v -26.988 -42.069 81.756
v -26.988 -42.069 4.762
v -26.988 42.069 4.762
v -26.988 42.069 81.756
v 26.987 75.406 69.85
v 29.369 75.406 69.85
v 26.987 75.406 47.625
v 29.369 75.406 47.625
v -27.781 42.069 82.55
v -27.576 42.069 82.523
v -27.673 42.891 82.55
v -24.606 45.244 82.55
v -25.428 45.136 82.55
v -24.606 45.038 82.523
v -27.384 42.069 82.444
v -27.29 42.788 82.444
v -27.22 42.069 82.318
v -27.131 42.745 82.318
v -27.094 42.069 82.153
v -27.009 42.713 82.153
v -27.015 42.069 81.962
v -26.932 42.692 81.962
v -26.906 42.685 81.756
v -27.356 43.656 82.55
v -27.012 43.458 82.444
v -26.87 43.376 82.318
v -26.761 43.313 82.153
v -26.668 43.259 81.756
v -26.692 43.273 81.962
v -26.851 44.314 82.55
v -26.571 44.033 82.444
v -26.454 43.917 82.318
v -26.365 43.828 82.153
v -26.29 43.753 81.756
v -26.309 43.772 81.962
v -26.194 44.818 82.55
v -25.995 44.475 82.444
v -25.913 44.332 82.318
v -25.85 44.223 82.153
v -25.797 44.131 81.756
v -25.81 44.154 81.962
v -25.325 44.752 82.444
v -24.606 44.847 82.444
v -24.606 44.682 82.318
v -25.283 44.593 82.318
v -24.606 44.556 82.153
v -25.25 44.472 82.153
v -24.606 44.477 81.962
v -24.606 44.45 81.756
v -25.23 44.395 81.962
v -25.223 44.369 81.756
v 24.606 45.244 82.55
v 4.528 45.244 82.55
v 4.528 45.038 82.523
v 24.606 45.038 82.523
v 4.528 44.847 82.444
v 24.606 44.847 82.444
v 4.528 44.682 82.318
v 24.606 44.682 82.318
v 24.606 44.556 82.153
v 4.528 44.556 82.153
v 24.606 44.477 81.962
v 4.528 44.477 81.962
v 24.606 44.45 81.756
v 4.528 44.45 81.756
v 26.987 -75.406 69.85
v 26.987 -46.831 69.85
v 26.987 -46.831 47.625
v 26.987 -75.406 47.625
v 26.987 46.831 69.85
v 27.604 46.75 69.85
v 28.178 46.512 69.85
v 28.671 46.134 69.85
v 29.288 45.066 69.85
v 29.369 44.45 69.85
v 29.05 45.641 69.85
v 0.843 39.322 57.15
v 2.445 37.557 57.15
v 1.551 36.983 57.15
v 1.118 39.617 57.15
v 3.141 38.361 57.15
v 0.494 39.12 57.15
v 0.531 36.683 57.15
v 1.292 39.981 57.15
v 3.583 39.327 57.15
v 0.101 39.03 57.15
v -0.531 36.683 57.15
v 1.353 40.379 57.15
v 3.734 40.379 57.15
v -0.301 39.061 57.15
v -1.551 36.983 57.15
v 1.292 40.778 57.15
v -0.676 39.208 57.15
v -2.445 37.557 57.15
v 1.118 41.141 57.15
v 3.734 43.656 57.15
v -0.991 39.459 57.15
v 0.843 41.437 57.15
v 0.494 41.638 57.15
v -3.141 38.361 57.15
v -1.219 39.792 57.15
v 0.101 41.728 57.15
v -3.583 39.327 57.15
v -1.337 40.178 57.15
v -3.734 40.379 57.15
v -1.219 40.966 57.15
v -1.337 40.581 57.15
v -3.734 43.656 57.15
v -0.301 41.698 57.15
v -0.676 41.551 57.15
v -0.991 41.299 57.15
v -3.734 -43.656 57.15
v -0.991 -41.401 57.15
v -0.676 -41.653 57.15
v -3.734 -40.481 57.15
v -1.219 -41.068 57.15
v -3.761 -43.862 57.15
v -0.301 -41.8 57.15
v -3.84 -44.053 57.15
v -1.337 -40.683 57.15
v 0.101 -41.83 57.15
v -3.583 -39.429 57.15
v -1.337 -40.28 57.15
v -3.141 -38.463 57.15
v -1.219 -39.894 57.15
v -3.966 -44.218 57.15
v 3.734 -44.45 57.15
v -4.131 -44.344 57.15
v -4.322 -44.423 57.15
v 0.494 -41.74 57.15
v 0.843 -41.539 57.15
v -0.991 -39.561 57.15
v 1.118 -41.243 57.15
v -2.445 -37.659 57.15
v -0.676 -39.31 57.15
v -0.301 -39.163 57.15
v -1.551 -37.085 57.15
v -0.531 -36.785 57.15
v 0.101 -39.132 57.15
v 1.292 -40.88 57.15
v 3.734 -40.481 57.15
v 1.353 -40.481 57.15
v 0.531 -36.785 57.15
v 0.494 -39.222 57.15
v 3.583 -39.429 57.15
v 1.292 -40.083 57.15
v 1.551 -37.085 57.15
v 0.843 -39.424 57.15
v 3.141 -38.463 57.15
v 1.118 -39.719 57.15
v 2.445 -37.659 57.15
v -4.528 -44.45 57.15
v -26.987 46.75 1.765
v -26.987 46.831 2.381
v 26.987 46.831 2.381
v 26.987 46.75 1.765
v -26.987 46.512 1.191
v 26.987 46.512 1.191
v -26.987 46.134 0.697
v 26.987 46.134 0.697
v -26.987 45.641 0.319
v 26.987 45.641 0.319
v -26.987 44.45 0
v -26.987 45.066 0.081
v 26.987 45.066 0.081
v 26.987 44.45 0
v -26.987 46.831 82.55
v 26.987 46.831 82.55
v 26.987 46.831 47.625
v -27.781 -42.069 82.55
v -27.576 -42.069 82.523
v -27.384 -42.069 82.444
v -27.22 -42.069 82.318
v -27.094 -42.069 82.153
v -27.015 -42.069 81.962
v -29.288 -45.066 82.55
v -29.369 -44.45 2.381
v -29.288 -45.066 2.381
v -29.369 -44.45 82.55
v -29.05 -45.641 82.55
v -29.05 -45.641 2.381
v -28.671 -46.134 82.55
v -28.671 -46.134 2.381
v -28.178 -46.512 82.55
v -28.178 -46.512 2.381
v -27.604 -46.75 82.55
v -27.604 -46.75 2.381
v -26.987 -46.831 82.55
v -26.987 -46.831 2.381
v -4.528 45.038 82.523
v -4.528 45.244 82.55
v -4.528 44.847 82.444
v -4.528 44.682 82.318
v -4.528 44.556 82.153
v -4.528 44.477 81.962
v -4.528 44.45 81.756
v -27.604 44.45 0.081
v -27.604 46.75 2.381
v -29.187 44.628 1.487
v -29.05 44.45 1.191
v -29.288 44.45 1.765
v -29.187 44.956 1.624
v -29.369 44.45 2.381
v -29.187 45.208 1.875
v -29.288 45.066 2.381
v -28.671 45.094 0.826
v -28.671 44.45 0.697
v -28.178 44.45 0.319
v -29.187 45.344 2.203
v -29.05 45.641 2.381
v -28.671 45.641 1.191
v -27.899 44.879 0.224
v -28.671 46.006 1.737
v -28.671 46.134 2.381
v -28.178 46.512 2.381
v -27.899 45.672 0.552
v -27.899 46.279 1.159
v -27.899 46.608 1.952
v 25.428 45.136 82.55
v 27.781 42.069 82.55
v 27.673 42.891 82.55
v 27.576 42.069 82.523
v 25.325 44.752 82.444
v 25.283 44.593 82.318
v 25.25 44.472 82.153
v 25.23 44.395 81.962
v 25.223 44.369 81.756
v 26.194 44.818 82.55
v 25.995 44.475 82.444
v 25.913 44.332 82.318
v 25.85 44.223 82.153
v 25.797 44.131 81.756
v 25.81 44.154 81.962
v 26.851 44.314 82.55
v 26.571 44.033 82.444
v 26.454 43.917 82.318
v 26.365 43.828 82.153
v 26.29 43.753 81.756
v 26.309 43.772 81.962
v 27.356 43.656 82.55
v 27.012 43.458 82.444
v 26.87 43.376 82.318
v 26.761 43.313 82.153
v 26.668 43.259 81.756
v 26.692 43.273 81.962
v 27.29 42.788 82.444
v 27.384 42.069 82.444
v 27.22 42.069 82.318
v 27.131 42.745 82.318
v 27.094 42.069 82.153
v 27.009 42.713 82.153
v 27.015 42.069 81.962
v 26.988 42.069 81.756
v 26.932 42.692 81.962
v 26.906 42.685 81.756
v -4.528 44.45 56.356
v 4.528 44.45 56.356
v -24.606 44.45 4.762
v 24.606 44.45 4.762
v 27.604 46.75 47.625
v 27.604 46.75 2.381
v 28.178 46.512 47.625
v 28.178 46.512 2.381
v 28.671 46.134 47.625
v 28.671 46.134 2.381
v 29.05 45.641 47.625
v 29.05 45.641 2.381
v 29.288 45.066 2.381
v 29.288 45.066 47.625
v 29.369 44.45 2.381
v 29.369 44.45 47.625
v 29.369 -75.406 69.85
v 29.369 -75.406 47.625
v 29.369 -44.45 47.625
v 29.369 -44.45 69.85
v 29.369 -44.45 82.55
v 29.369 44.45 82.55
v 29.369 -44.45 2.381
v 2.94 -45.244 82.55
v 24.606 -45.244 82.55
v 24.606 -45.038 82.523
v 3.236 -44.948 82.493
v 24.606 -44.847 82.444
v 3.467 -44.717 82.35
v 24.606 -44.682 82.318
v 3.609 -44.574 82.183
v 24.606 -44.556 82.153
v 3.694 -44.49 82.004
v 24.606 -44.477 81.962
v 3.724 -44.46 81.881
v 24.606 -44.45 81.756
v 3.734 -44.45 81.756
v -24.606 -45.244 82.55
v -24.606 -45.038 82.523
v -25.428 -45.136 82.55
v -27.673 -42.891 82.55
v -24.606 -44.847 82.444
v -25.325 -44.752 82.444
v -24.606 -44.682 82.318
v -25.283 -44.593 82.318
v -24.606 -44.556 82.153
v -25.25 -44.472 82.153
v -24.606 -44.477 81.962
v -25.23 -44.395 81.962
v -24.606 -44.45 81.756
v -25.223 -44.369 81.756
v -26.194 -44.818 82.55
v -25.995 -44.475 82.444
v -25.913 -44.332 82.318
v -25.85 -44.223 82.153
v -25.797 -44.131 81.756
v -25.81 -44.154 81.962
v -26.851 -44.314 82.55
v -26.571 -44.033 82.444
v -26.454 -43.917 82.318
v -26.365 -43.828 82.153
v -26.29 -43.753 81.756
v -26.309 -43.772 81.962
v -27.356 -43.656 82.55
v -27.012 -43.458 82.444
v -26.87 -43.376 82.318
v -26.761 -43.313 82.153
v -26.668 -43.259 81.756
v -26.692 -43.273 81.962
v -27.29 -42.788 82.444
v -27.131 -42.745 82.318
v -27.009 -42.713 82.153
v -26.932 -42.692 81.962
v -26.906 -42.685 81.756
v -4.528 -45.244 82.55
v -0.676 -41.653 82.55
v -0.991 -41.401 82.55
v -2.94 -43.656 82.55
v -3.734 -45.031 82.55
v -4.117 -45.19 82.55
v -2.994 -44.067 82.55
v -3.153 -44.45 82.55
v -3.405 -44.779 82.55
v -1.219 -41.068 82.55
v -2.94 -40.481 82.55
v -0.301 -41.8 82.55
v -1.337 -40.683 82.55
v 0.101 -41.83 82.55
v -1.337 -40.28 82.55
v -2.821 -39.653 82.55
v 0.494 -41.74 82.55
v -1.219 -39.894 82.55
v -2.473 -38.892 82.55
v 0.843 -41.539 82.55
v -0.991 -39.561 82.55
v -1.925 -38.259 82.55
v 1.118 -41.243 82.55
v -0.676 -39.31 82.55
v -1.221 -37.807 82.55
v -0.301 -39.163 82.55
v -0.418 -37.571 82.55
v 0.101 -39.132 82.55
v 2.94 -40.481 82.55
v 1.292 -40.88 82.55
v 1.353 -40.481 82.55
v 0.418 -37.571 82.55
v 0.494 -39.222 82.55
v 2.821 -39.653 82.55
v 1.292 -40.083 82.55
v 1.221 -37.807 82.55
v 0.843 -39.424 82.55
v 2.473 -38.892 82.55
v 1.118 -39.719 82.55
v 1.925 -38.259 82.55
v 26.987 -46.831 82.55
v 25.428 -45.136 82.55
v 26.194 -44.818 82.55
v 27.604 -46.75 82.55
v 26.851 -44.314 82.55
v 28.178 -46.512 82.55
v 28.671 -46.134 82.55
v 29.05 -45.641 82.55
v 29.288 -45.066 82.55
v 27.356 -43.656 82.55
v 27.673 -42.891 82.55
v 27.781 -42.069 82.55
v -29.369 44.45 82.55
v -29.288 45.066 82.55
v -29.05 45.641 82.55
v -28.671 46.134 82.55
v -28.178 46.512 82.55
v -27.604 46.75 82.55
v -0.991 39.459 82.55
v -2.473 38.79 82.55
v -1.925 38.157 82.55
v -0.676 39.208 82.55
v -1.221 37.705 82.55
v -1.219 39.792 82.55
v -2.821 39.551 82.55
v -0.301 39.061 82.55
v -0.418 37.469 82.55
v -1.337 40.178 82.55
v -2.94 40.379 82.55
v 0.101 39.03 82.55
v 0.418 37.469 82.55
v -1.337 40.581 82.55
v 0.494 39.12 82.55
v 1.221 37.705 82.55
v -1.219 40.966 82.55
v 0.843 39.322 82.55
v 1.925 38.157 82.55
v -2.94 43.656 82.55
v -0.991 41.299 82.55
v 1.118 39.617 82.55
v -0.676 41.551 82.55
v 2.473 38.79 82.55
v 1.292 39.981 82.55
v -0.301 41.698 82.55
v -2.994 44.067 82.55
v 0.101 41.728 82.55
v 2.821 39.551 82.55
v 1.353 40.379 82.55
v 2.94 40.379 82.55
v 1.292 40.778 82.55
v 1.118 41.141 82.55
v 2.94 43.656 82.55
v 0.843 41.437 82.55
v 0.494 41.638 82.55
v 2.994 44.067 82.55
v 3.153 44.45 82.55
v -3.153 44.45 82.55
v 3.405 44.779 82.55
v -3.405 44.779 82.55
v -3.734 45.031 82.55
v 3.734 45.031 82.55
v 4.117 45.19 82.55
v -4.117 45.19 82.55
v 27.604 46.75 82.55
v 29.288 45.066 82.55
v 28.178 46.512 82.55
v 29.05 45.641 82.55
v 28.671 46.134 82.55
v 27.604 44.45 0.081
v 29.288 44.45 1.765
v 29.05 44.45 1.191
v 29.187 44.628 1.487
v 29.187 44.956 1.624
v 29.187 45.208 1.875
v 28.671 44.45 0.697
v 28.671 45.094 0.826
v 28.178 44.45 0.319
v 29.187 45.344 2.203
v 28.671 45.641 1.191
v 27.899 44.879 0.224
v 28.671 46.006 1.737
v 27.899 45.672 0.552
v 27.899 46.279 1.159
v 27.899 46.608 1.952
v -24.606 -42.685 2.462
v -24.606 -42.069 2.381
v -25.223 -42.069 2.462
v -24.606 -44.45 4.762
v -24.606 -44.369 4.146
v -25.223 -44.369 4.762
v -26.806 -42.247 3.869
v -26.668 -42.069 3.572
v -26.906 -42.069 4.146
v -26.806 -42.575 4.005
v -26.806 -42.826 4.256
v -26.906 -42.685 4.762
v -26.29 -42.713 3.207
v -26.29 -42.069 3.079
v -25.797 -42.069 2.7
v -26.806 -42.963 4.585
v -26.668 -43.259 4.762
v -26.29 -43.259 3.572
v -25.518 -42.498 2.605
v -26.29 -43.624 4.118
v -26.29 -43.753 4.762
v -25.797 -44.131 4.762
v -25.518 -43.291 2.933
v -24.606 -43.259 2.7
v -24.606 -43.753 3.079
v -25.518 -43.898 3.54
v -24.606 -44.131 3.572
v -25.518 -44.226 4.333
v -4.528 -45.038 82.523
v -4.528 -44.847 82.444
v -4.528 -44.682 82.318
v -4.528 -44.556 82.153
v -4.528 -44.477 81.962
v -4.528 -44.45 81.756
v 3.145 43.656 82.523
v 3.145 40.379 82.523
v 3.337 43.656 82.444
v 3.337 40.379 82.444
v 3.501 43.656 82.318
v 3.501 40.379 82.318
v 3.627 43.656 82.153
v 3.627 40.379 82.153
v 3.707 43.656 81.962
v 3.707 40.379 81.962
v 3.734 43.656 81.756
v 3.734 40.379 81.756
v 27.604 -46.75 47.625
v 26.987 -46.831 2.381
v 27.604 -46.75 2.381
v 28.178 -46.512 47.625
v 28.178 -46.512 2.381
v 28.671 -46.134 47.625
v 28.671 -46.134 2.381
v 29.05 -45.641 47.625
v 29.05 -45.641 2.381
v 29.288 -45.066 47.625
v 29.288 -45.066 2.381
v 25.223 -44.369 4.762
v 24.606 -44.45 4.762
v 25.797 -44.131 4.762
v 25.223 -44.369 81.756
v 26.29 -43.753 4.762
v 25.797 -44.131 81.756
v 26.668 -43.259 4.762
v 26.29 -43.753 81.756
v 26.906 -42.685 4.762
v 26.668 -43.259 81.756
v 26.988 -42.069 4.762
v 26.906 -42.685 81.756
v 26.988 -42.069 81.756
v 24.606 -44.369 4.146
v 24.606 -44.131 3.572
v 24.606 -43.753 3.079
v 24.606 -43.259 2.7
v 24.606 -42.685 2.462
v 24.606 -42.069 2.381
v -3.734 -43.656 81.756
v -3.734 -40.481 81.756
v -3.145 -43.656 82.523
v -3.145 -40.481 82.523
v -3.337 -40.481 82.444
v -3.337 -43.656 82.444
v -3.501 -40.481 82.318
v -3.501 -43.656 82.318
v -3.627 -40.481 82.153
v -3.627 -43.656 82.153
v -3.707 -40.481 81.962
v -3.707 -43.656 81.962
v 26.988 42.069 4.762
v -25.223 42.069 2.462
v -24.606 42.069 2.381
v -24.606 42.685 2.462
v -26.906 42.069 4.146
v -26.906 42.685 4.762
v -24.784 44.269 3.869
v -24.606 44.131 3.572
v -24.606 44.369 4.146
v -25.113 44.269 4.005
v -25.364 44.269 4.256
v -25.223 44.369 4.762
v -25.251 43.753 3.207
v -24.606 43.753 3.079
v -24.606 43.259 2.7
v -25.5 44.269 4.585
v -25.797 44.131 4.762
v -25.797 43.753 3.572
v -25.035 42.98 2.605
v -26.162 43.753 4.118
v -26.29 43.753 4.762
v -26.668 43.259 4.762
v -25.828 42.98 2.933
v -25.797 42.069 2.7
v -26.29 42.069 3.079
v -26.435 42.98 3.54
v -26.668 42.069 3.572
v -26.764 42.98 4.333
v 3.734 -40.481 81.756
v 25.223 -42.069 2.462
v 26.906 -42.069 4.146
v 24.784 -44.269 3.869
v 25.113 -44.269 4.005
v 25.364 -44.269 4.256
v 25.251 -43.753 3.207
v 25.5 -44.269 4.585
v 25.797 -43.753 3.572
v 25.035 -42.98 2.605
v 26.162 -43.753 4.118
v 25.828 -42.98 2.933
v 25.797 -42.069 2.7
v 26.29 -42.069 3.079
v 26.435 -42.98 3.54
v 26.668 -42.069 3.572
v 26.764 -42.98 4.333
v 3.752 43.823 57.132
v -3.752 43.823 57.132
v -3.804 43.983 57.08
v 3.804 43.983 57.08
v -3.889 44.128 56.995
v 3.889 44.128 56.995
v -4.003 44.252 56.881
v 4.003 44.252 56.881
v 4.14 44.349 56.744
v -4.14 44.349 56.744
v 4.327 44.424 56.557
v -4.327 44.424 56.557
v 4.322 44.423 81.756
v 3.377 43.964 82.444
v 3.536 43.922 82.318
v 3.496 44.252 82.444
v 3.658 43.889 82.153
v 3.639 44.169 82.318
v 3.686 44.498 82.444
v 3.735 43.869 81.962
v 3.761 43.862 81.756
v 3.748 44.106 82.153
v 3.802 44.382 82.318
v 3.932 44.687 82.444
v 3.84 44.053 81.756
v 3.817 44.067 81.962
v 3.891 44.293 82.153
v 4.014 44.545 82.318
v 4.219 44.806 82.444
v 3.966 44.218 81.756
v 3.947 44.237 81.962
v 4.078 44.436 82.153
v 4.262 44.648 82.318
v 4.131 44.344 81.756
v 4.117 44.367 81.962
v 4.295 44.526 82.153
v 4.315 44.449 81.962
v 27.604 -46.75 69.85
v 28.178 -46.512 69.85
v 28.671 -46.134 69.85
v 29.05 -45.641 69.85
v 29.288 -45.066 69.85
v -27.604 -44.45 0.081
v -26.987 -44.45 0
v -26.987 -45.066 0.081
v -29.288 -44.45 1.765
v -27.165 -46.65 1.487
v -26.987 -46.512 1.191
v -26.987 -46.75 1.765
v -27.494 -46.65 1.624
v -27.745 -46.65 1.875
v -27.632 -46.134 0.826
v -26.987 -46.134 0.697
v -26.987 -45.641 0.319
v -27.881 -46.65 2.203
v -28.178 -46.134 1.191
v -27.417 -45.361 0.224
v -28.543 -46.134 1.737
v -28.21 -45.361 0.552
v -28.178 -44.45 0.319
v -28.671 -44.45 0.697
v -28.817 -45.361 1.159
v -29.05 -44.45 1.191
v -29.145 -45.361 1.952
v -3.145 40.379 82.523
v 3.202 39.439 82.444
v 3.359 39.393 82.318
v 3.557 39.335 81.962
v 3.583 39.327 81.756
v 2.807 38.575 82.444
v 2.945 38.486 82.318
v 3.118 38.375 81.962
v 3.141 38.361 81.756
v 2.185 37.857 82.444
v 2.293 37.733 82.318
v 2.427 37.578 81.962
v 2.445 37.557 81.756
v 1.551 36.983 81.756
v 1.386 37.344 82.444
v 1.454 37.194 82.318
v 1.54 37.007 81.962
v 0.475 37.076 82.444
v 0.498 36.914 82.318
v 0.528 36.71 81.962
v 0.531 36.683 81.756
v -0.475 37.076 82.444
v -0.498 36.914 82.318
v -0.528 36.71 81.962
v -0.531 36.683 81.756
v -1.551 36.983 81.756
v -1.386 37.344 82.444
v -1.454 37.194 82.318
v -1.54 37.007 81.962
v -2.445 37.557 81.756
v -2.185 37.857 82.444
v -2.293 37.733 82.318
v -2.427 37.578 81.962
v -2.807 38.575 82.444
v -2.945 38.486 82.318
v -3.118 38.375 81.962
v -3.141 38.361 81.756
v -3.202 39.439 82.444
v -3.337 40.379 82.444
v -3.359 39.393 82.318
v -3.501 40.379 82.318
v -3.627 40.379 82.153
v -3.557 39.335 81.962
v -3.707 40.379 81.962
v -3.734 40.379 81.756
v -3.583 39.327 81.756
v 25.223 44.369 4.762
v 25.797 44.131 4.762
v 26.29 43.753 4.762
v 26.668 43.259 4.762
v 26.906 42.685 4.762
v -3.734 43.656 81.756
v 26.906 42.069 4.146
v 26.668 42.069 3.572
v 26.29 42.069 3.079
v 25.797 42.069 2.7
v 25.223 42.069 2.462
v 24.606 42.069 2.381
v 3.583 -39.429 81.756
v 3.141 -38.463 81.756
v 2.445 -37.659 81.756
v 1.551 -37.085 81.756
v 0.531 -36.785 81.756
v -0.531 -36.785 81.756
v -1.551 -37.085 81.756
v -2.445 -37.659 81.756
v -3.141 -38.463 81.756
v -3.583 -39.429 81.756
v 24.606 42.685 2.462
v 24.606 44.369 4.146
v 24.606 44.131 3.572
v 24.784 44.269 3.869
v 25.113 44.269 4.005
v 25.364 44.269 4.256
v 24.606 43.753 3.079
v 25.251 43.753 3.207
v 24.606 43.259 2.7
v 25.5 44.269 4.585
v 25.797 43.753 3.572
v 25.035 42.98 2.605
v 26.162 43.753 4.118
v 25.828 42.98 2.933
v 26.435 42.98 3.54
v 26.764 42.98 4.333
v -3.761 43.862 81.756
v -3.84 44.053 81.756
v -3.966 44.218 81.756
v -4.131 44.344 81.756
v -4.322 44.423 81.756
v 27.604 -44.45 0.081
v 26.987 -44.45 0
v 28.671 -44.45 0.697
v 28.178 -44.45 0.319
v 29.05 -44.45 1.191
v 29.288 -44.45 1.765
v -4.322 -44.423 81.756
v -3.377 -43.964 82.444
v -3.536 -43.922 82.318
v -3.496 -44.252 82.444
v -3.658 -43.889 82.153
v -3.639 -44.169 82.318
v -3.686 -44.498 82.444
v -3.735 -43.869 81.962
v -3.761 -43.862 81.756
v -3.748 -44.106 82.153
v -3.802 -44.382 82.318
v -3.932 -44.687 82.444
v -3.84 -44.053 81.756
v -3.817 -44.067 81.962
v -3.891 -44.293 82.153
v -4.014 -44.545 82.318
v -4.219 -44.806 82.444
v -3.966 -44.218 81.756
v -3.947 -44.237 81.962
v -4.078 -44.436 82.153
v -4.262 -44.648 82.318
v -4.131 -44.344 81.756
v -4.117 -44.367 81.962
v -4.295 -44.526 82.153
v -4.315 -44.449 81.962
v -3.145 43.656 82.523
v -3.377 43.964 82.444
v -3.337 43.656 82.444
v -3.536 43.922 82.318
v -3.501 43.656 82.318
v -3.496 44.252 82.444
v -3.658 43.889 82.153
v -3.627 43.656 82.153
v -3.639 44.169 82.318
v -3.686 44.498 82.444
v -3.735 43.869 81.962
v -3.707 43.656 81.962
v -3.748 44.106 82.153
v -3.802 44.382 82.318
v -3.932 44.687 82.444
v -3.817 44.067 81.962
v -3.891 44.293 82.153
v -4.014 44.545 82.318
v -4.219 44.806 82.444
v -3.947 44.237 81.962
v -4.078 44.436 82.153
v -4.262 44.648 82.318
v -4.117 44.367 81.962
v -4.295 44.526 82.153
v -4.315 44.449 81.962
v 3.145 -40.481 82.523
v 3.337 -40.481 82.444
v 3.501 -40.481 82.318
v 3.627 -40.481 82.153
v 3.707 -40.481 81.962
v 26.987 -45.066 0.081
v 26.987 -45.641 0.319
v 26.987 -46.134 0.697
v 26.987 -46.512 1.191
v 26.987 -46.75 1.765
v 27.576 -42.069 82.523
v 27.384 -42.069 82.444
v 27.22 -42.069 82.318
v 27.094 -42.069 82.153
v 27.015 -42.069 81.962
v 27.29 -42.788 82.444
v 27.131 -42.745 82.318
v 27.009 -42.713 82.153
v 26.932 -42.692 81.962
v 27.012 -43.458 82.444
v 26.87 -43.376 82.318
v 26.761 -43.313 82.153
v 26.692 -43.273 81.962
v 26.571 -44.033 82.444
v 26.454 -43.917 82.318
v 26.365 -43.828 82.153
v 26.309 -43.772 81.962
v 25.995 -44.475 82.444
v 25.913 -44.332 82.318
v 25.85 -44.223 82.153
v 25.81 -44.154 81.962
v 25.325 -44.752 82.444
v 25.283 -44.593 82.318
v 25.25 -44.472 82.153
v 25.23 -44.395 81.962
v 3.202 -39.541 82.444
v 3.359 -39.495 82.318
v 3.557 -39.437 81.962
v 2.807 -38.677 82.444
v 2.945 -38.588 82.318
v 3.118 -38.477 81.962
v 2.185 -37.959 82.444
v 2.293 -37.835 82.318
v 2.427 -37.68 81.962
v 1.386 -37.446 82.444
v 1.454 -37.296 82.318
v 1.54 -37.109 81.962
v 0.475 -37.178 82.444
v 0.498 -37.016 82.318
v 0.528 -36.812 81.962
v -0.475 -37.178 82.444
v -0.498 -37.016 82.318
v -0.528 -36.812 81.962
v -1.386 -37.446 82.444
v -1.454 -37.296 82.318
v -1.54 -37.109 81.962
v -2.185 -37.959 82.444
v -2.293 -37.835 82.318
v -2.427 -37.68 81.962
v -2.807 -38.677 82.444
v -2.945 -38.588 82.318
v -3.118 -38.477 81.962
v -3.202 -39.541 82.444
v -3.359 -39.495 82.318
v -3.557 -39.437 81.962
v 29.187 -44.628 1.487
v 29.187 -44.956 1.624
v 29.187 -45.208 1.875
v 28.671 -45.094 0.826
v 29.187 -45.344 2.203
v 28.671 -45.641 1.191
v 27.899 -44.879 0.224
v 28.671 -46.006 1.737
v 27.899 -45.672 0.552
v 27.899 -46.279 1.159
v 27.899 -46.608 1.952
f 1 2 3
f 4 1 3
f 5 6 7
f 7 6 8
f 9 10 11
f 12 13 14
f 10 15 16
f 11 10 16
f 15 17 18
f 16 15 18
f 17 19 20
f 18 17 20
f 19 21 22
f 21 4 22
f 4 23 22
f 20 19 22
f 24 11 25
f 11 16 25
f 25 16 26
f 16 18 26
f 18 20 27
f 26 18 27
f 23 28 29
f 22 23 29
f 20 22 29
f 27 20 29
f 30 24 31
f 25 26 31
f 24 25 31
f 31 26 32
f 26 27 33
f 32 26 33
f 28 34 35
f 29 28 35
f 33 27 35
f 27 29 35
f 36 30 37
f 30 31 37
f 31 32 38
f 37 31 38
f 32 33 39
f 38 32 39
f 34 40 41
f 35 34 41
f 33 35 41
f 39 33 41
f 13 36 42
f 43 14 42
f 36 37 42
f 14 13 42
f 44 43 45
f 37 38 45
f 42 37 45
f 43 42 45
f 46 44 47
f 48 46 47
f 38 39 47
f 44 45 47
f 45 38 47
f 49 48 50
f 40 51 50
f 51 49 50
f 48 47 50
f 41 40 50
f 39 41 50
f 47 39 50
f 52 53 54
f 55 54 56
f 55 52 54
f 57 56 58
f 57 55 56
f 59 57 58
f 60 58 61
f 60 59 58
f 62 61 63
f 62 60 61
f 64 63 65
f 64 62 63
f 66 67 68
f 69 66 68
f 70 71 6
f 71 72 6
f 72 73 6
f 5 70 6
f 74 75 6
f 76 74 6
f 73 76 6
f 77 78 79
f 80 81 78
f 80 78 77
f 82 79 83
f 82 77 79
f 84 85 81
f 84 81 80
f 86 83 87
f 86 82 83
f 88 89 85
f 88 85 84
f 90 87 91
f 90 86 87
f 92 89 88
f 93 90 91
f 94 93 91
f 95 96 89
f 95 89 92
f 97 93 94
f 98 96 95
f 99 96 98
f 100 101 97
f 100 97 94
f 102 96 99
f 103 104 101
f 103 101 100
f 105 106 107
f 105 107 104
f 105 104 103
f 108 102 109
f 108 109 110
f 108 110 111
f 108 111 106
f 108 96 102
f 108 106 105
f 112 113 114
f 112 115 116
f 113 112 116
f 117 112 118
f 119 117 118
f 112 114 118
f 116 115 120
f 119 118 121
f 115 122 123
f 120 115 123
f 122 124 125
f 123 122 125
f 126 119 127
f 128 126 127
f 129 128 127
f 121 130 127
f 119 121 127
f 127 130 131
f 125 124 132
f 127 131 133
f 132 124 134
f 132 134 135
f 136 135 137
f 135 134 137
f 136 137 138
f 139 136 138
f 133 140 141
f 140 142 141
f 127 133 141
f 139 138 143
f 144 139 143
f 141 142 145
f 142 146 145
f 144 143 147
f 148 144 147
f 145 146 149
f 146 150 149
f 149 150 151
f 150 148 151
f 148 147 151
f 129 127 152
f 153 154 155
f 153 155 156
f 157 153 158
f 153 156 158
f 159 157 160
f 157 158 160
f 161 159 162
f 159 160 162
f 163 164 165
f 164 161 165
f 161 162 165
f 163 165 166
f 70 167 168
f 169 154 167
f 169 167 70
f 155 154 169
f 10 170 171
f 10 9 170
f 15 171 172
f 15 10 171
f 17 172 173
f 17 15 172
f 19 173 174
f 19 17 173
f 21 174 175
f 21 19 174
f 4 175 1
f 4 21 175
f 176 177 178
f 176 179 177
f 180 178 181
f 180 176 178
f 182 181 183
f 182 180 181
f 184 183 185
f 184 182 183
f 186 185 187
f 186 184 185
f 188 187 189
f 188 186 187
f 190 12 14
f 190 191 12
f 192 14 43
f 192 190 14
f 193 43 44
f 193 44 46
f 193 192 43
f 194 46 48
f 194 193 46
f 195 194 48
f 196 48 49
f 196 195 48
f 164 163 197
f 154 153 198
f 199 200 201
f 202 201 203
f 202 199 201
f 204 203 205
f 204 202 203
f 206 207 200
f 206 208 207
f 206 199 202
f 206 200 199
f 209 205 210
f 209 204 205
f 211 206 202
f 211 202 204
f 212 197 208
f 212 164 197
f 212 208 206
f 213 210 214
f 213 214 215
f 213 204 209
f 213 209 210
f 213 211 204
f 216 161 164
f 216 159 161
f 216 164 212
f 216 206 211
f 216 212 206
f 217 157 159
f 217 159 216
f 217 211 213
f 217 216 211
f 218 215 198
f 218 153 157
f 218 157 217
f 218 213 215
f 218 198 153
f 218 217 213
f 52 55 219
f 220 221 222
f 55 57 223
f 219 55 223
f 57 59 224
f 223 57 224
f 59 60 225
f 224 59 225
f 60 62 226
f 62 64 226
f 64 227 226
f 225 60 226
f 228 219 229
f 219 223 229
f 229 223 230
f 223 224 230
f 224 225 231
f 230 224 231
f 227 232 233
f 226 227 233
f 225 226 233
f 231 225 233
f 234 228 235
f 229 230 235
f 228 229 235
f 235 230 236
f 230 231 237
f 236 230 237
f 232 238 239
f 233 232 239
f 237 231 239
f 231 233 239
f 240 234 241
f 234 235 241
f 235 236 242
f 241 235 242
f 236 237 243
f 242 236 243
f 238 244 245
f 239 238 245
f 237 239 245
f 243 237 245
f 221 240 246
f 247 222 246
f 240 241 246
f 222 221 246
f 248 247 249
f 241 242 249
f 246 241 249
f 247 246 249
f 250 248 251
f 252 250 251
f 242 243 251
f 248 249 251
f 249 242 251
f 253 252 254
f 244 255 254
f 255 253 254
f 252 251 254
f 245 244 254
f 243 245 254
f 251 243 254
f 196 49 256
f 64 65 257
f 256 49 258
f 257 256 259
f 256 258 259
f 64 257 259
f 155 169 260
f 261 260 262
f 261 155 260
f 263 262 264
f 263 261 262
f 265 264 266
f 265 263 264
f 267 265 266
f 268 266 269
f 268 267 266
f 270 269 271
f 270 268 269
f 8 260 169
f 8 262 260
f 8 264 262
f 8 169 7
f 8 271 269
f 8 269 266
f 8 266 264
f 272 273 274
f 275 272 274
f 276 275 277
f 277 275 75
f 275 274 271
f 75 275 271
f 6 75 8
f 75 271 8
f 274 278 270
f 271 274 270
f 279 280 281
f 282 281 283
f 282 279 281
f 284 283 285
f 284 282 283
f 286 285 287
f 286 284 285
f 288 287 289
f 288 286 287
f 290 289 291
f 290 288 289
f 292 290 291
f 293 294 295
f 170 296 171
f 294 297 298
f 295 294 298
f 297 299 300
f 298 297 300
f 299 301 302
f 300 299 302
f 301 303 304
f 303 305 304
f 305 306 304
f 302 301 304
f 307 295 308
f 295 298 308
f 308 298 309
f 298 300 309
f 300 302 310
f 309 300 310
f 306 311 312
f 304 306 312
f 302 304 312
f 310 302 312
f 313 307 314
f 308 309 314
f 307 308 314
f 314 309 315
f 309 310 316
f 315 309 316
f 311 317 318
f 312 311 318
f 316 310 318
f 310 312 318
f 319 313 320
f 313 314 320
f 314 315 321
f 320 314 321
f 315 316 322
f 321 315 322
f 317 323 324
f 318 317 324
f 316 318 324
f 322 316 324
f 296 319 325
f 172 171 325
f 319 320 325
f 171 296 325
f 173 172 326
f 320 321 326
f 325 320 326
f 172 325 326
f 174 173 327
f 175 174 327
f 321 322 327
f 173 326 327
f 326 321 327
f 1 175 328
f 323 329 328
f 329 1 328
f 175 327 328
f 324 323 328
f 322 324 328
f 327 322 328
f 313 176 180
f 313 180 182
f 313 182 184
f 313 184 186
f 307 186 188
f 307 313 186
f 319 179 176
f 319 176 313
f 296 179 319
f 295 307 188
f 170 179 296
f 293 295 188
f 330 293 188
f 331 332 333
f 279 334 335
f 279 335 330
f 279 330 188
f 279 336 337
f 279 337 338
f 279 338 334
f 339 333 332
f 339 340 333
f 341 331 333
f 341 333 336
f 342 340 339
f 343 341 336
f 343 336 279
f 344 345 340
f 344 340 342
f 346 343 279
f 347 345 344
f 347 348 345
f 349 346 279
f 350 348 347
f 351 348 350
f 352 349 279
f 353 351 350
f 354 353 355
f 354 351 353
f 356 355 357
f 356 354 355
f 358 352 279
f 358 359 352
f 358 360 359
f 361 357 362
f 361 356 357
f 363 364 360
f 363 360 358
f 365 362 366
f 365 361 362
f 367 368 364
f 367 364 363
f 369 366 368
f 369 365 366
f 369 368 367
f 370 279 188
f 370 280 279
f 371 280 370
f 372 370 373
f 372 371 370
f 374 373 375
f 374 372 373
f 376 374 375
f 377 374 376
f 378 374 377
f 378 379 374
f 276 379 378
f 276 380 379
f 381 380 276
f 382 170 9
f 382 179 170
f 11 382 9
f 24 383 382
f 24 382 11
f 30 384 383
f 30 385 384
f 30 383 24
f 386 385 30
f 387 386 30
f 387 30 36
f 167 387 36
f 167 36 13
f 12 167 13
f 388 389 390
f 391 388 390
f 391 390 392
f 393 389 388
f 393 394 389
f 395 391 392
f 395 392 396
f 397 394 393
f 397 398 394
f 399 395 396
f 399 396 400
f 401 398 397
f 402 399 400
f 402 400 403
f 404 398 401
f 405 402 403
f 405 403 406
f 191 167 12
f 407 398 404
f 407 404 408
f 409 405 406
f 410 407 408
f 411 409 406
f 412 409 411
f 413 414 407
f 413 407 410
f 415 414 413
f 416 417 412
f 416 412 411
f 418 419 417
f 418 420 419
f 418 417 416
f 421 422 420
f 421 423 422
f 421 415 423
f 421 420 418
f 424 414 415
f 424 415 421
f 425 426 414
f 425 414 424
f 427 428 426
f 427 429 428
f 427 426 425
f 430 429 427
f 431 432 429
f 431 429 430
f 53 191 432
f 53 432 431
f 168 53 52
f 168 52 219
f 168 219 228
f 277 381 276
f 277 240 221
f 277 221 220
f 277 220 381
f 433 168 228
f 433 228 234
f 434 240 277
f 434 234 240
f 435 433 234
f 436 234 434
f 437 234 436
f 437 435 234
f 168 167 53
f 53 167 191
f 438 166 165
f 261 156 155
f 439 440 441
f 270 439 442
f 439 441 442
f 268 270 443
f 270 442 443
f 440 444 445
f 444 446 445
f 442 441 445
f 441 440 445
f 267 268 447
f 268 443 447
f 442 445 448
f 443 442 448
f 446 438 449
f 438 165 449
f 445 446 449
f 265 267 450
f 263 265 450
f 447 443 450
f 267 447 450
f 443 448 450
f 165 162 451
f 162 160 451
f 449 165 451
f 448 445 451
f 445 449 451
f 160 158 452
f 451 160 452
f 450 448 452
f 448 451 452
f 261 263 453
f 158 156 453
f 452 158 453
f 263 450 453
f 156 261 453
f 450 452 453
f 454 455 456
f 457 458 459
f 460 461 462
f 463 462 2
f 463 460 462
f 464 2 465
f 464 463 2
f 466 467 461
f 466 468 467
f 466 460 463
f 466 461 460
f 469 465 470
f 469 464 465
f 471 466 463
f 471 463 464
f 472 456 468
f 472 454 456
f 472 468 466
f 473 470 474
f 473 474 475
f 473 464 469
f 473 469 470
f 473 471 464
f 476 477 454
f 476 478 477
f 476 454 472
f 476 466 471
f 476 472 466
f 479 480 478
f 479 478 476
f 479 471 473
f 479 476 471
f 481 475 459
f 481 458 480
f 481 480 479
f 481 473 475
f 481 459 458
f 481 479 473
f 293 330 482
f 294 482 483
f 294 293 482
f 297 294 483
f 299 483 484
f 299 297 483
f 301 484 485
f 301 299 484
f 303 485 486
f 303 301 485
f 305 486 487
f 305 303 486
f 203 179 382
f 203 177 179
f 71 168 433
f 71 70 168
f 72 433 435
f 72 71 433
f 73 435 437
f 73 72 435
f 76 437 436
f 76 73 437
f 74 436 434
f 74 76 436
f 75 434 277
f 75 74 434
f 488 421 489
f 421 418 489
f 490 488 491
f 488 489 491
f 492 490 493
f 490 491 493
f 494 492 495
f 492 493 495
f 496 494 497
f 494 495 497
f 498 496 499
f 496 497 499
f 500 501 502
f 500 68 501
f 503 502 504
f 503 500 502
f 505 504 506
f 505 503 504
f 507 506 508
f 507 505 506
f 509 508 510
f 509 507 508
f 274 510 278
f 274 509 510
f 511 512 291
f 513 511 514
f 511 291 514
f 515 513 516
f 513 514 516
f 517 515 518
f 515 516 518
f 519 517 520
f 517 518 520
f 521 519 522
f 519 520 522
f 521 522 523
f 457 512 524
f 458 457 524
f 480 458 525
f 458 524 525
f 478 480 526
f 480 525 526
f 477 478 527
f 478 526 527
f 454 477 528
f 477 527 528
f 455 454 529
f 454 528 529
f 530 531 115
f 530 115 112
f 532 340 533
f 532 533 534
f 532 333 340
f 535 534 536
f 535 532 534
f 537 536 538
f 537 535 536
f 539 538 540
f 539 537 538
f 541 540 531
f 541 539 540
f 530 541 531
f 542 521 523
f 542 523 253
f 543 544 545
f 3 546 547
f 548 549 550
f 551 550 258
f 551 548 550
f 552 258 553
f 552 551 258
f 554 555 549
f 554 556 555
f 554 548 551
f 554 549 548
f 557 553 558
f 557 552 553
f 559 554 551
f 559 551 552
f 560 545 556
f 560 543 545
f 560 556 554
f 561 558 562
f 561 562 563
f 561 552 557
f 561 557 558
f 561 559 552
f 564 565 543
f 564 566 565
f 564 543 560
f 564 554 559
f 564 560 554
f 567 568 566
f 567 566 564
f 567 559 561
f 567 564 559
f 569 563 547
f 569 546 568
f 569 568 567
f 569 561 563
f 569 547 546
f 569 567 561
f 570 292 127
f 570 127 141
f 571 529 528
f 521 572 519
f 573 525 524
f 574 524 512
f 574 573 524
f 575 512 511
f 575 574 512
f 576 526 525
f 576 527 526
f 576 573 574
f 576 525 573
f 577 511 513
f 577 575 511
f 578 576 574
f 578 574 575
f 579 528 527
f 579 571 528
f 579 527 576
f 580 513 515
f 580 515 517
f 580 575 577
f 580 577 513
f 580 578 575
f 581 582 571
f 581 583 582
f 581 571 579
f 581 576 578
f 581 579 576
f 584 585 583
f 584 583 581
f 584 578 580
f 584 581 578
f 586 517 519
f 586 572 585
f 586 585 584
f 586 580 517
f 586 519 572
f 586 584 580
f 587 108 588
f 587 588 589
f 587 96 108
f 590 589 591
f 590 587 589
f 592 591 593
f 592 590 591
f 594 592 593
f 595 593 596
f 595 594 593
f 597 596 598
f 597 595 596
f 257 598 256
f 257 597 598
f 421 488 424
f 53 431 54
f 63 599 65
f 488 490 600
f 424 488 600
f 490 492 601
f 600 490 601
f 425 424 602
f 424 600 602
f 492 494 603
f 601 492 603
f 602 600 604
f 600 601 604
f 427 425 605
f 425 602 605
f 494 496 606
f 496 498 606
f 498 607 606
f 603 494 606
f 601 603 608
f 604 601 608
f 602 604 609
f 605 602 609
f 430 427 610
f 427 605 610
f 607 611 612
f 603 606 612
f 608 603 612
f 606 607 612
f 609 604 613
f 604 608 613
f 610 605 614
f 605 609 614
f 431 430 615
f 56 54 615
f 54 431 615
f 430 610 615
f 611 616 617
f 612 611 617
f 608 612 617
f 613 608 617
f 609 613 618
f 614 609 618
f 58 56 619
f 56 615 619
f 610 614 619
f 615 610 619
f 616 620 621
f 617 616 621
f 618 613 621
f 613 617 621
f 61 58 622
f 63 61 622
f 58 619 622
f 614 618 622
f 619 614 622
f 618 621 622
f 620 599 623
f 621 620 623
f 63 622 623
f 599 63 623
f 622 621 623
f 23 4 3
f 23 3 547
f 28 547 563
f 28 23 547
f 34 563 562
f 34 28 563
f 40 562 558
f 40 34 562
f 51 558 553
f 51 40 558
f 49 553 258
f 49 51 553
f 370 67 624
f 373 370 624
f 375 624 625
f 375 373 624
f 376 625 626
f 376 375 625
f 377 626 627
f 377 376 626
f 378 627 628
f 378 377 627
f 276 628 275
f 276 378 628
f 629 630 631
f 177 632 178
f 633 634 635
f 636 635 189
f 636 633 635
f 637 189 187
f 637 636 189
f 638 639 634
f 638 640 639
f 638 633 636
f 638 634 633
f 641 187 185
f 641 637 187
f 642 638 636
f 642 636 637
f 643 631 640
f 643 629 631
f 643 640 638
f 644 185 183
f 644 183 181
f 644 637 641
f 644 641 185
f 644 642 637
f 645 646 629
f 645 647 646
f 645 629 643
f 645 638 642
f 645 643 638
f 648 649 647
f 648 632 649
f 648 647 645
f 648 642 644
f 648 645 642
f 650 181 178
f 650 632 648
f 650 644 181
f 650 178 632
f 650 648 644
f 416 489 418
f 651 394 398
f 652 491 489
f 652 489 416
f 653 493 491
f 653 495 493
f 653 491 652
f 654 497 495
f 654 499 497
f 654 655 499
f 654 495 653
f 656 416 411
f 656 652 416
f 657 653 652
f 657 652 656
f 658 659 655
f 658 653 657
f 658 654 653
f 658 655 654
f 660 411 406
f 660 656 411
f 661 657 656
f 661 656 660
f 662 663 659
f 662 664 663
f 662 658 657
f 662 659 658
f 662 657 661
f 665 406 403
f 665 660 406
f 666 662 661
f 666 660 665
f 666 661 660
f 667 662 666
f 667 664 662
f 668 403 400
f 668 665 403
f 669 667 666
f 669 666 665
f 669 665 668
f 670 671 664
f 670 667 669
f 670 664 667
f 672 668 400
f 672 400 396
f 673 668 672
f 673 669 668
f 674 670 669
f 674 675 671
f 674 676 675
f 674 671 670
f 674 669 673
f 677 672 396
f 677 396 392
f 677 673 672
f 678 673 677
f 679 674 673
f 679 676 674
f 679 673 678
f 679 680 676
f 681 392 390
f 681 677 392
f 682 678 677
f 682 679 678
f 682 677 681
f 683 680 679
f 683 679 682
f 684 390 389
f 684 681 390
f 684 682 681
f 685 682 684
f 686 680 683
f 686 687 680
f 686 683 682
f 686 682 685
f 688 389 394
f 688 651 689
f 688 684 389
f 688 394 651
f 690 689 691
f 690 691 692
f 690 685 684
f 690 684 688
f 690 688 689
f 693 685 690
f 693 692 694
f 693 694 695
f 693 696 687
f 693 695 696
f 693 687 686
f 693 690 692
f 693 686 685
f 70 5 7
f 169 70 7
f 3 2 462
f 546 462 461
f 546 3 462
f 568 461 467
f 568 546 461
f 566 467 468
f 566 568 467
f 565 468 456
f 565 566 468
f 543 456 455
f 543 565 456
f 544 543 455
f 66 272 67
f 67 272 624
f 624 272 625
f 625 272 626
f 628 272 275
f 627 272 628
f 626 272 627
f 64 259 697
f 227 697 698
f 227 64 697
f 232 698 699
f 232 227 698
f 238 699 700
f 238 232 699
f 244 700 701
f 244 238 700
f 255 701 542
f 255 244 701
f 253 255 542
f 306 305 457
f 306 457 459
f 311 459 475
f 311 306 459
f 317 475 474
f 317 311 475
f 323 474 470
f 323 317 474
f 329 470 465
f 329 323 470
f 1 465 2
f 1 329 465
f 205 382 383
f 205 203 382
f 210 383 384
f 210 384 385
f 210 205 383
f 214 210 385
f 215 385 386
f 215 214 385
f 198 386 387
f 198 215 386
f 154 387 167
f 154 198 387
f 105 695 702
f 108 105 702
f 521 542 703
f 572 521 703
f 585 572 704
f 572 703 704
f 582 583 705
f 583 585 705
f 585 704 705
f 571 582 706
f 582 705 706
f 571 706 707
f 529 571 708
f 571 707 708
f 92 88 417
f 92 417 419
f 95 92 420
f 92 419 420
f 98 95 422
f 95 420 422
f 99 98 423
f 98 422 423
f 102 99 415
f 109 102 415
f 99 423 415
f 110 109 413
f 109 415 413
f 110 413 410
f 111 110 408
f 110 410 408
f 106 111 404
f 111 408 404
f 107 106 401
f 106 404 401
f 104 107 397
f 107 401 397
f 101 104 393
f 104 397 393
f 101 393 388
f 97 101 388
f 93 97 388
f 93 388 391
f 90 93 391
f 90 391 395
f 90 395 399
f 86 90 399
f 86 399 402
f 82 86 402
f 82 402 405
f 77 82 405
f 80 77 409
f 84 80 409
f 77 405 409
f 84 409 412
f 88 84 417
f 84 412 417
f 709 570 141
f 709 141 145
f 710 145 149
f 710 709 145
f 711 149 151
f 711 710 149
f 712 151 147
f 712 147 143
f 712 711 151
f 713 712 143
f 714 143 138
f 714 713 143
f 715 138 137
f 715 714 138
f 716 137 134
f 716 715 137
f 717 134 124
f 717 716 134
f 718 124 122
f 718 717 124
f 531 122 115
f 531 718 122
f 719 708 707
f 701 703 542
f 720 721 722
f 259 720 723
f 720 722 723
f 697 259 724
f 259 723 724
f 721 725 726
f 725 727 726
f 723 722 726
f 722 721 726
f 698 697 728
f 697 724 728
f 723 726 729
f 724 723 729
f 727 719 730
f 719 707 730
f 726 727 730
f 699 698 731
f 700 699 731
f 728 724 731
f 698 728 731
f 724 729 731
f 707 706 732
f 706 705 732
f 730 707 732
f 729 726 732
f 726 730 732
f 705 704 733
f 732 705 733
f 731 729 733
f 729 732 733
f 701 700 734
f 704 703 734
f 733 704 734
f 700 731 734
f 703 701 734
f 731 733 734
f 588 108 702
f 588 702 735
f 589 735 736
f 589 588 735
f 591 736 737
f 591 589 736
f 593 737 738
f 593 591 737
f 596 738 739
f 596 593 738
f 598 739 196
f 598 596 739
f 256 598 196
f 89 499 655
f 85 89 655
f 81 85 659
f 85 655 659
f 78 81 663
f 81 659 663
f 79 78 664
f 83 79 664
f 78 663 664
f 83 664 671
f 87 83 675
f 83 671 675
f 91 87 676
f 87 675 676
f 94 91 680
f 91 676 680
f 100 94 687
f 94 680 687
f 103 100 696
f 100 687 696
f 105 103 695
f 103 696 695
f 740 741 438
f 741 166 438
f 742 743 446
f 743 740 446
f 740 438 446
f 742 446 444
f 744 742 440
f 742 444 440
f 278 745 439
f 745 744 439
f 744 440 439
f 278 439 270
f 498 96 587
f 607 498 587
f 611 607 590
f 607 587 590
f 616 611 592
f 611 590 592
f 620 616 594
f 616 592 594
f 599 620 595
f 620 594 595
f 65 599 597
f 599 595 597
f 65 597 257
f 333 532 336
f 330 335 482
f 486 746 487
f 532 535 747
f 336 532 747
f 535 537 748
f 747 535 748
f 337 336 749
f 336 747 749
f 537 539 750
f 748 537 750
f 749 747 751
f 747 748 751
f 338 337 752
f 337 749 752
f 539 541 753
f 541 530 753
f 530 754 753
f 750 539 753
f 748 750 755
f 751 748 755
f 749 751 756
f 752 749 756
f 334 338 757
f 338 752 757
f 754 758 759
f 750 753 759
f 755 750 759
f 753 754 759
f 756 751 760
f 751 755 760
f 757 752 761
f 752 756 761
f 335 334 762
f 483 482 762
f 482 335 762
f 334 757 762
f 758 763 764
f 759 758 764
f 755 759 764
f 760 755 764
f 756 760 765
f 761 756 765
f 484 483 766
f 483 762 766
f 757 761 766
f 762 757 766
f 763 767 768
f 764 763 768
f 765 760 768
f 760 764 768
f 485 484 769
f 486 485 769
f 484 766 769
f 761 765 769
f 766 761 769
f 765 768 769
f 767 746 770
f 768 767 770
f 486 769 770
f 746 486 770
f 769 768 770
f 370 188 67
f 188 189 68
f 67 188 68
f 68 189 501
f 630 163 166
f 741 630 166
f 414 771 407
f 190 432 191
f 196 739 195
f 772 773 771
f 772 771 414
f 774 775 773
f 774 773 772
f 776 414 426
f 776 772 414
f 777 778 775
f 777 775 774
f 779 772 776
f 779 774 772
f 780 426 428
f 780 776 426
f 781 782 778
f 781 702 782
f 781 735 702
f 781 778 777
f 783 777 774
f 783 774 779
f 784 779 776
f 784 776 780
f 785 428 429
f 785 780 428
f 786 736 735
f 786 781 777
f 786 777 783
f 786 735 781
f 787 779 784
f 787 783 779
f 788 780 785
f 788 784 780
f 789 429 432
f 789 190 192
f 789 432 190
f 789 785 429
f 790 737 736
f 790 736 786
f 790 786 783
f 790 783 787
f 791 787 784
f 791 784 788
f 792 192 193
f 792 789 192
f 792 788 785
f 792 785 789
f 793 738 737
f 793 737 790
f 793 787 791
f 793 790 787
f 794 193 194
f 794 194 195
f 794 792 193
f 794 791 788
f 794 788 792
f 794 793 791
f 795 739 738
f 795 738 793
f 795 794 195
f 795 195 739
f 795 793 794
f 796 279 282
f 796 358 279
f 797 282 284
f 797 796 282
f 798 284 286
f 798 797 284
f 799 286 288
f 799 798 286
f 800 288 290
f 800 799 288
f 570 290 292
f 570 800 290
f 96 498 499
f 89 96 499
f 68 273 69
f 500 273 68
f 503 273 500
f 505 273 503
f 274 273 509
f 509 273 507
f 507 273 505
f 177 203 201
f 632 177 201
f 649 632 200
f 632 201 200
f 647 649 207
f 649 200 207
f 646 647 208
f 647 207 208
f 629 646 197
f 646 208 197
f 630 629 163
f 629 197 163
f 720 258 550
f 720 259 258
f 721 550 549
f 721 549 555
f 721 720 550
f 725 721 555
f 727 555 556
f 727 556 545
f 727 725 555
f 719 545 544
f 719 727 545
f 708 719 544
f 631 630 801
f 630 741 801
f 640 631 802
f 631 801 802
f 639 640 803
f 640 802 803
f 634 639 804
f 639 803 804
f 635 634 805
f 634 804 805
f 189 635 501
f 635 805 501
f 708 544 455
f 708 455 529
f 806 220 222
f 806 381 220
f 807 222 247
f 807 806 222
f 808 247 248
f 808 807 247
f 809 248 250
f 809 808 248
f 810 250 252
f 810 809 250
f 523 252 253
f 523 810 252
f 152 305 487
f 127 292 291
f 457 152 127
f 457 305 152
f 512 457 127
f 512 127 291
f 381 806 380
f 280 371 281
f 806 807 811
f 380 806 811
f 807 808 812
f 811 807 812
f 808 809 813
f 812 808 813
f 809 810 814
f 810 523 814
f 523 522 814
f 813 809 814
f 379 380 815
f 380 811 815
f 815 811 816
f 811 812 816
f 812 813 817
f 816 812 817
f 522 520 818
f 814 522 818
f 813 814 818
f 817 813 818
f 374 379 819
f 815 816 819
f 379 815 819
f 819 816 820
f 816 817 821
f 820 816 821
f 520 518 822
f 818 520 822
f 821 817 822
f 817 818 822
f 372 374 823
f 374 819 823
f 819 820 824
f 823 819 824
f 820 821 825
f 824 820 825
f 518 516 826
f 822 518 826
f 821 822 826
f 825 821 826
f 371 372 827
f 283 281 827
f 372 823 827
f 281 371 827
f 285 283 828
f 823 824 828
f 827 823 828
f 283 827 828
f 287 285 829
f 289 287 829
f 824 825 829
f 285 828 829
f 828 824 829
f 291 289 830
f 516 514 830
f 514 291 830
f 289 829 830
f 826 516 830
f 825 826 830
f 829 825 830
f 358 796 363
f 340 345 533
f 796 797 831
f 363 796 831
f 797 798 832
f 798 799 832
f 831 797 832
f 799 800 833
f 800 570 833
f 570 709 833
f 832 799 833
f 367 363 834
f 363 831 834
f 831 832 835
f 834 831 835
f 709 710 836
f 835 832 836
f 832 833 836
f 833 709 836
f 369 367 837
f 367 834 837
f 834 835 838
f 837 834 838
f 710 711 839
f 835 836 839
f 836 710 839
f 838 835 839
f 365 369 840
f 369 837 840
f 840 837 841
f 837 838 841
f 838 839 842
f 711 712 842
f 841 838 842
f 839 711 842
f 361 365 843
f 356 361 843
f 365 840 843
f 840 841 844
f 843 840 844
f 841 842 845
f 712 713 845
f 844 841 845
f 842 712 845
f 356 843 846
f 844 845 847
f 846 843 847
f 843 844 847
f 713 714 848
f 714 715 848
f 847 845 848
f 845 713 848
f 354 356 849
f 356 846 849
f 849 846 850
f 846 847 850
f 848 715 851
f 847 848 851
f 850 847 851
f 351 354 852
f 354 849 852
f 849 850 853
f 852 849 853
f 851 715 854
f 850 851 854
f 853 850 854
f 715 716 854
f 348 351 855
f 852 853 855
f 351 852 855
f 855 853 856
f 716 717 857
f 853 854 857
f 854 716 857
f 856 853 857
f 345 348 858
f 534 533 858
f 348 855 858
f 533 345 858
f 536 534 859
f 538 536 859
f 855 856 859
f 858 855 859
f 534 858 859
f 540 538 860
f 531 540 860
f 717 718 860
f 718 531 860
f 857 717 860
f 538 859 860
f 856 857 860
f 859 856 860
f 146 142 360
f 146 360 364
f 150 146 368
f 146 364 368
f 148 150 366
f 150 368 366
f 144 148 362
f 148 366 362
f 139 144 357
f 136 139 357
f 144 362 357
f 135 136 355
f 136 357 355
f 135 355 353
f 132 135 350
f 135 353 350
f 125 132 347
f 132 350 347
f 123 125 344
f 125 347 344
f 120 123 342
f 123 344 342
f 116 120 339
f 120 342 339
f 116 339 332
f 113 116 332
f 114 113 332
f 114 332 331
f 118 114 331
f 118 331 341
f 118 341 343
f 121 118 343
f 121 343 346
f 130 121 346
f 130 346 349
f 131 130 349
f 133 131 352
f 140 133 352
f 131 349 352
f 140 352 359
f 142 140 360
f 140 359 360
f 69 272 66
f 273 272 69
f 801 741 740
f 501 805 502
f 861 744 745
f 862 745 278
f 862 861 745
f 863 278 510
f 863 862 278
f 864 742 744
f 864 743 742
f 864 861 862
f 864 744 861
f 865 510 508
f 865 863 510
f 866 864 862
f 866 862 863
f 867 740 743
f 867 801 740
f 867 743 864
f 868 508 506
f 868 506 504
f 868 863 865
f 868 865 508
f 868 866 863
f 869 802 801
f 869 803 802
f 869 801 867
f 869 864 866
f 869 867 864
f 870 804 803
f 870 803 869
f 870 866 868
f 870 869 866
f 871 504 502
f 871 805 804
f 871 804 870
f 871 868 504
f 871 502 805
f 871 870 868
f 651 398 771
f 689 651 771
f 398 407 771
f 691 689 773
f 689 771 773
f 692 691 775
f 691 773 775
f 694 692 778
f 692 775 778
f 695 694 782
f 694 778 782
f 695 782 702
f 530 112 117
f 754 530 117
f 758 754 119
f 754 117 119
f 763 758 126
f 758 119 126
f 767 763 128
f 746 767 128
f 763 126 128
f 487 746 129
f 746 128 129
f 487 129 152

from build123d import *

# Parameters (mm, degrees)
SKETCH1_W           = 58.7375
SKETCH1_H           = 93.6625
BACK_DEPTH          = 2.38125
SKETCH2_W           = 58.7375
SKETCH2_H           = 93.6625
SKETCH2_W_2         = 53.975
SKETCH2_H_2         = 88.9
SIDES_DEPTH         = 80.16875
SKETCH6_R           = 1.35255
BOSS_EXTRUDE6_DEPTH = 25.4
SKETCH5_W           = 22.225
SKETCH5_H           = 28.575
BOSS_EXTRUDE5_DEPTH = 2.38125
FILLET4_R           = 2.38125
FILLET5_R           = 0.79375


with BuildPart() as part:
    # Sketch1 → Back (new body)
    with BuildSketch(Plane.XY):
        Rectangle(SKETCH1_W, SKETCH1_H)
    extrude(amount=BACK_DEPTH)

    # Sketch2 → Sides (add)
    with BuildSketch(Plane.XY.offset(2.38125)):
        Rectangle(SKETCH2_W, SKETCH2_H)
        Rectangle(SKETCH2_W_2, SKETCH2_H_2, mode=Mode.SUBTRACT)
    extrude(amount=SIDES_DEPTH)

    # Sketch6 → Boss-Extrude6 (add)
    # profile 1 of 2: a face of its own
    with BuildSketch(Plane.XY.offset(82.55)):
        with BuildLine():
            Line((-3.7338, 40.379264529), (-3.7338, 44.45))
            Line((-3.7338, 44.45), (3.7338, 44.45))
            Line((3.7338, 44.45), (3.7338, 40.379264529))
            ThreePointArc((3.7338, 40.379264529), (0, 36.645464529), (-3.7338, 40.379264529))
        make_face()
        with Locations((0, 40.379264529)):
            Circle(SKETCH6_R, mode=Mode.SUBTRACT)
    # profile 2 of 2: a face of its own
    with BuildSketch(Plane.XY.offset(82.55)):
        with BuildLine():
            Line((-3.7338, -40.48125), (-3.7338, -44.45))
            Line((-3.7338, -44.45), (3.7338, -44.45))
            Line((3.7338, -44.45), (3.7338, -40.48125))
            ThreePointArc((3.7338, -40.48125), (0, -36.74745), (-3.7338, -40.48125))
        make_face()
        with Locations((0, -40.48125)):
            Circle(SKETCH6_R, mode=Mode.SUBTRACT)
    extrude(amount=-BOSS_EXTRUDE6_DEPTH)

    # Sketch5 → Boss-Extrude5 (add)
    with BuildSketch(Plane(origin=(29.36875, 0, 0), x_dir=(0, 0, -1), z_dir=(1, 0, 0))):
        with Locations((-58.7375, 61.11875)):
            Rectangle(SKETCH5_W, SKETCH5_H)
        with Locations((-58.7375, -61.11875)):
            Rectangle(SKETCH5_W, SKETCH5_H)
    extrude(amount=-BOSS_EXTRUDE5_DEPTH)

    # Fillet4
    fillet4_edges = [part.edges().sort_by_distance(p)[0] for p in [
        (26.9875, 0, 2.38125),
        (0, -44.45, 2.38125),
        (-26.9875, 0, 2.38125),
        (0, 44.45, 2.38125),
        (0, 46.83125, 0),
        (-29.36875, 0, 0),
        (0, -46.83125, 0),
        (29.36875, 0, 0),
        (-26.9875, -44.45, 42.465625),
        (-26.9875, 44.45, 42.465625),
        (26.9875, 44.45, 42.465625),
        (26.9875, -44.45, 42.465625),
        (29.36875, 46.83125, 23.8125),
        (29.36875, -46.83125, 23.8125),
        (29.36875, -46.83125, 76.2),
        (29.36875, 46.83125, 76.2),
        (-29.36875, -46.83125, 41.275),
        (-29.36875, 46.83125, 41.275),
    ]]
    fillet(fillet4_edges, radius=FILLET4_R)

    # Fillet5
    fillet5_edges = [part.edges().sort_by_distance(p)[0] for p in [
        (-26.290048023, -43.752548023, 82.55),
        (-26.290048023, 43.752548023, 82.55),
        (26.290048023, 43.752548023, 82.55),
        (26.290048023, -43.752548023, 82.55),
        (-14.170025, 44.45, 82.55),
        (0, 44.45, 57.15),
        (-3.7338, 44.45, 69.85),
        (3.7338, 44.45, 69.85),
        (0, 36.645464529, 82.55),
        (3.7338, 42.414632265, 82.55),
        (-3.7338, 42.414632265, 82.55),
        (14.170025, -44.45, 82.55),
        (-3.7338, -44.45, 69.85),
        (0, -36.74745, 82.55),
        (-3.7338, -42.465625, 82.55),
        (3.7338, -42.465625, 82.55),
        (26.9875, 0, 82.55),
        (-14.170025, -44.45, 82.55),
        (-26.9875, 0, 82.55),
        (14.170025, 44.45, 82.55),
    ]]
    fillet(fillet5_edges, radius=FILLET5_R)


solid = part.part
